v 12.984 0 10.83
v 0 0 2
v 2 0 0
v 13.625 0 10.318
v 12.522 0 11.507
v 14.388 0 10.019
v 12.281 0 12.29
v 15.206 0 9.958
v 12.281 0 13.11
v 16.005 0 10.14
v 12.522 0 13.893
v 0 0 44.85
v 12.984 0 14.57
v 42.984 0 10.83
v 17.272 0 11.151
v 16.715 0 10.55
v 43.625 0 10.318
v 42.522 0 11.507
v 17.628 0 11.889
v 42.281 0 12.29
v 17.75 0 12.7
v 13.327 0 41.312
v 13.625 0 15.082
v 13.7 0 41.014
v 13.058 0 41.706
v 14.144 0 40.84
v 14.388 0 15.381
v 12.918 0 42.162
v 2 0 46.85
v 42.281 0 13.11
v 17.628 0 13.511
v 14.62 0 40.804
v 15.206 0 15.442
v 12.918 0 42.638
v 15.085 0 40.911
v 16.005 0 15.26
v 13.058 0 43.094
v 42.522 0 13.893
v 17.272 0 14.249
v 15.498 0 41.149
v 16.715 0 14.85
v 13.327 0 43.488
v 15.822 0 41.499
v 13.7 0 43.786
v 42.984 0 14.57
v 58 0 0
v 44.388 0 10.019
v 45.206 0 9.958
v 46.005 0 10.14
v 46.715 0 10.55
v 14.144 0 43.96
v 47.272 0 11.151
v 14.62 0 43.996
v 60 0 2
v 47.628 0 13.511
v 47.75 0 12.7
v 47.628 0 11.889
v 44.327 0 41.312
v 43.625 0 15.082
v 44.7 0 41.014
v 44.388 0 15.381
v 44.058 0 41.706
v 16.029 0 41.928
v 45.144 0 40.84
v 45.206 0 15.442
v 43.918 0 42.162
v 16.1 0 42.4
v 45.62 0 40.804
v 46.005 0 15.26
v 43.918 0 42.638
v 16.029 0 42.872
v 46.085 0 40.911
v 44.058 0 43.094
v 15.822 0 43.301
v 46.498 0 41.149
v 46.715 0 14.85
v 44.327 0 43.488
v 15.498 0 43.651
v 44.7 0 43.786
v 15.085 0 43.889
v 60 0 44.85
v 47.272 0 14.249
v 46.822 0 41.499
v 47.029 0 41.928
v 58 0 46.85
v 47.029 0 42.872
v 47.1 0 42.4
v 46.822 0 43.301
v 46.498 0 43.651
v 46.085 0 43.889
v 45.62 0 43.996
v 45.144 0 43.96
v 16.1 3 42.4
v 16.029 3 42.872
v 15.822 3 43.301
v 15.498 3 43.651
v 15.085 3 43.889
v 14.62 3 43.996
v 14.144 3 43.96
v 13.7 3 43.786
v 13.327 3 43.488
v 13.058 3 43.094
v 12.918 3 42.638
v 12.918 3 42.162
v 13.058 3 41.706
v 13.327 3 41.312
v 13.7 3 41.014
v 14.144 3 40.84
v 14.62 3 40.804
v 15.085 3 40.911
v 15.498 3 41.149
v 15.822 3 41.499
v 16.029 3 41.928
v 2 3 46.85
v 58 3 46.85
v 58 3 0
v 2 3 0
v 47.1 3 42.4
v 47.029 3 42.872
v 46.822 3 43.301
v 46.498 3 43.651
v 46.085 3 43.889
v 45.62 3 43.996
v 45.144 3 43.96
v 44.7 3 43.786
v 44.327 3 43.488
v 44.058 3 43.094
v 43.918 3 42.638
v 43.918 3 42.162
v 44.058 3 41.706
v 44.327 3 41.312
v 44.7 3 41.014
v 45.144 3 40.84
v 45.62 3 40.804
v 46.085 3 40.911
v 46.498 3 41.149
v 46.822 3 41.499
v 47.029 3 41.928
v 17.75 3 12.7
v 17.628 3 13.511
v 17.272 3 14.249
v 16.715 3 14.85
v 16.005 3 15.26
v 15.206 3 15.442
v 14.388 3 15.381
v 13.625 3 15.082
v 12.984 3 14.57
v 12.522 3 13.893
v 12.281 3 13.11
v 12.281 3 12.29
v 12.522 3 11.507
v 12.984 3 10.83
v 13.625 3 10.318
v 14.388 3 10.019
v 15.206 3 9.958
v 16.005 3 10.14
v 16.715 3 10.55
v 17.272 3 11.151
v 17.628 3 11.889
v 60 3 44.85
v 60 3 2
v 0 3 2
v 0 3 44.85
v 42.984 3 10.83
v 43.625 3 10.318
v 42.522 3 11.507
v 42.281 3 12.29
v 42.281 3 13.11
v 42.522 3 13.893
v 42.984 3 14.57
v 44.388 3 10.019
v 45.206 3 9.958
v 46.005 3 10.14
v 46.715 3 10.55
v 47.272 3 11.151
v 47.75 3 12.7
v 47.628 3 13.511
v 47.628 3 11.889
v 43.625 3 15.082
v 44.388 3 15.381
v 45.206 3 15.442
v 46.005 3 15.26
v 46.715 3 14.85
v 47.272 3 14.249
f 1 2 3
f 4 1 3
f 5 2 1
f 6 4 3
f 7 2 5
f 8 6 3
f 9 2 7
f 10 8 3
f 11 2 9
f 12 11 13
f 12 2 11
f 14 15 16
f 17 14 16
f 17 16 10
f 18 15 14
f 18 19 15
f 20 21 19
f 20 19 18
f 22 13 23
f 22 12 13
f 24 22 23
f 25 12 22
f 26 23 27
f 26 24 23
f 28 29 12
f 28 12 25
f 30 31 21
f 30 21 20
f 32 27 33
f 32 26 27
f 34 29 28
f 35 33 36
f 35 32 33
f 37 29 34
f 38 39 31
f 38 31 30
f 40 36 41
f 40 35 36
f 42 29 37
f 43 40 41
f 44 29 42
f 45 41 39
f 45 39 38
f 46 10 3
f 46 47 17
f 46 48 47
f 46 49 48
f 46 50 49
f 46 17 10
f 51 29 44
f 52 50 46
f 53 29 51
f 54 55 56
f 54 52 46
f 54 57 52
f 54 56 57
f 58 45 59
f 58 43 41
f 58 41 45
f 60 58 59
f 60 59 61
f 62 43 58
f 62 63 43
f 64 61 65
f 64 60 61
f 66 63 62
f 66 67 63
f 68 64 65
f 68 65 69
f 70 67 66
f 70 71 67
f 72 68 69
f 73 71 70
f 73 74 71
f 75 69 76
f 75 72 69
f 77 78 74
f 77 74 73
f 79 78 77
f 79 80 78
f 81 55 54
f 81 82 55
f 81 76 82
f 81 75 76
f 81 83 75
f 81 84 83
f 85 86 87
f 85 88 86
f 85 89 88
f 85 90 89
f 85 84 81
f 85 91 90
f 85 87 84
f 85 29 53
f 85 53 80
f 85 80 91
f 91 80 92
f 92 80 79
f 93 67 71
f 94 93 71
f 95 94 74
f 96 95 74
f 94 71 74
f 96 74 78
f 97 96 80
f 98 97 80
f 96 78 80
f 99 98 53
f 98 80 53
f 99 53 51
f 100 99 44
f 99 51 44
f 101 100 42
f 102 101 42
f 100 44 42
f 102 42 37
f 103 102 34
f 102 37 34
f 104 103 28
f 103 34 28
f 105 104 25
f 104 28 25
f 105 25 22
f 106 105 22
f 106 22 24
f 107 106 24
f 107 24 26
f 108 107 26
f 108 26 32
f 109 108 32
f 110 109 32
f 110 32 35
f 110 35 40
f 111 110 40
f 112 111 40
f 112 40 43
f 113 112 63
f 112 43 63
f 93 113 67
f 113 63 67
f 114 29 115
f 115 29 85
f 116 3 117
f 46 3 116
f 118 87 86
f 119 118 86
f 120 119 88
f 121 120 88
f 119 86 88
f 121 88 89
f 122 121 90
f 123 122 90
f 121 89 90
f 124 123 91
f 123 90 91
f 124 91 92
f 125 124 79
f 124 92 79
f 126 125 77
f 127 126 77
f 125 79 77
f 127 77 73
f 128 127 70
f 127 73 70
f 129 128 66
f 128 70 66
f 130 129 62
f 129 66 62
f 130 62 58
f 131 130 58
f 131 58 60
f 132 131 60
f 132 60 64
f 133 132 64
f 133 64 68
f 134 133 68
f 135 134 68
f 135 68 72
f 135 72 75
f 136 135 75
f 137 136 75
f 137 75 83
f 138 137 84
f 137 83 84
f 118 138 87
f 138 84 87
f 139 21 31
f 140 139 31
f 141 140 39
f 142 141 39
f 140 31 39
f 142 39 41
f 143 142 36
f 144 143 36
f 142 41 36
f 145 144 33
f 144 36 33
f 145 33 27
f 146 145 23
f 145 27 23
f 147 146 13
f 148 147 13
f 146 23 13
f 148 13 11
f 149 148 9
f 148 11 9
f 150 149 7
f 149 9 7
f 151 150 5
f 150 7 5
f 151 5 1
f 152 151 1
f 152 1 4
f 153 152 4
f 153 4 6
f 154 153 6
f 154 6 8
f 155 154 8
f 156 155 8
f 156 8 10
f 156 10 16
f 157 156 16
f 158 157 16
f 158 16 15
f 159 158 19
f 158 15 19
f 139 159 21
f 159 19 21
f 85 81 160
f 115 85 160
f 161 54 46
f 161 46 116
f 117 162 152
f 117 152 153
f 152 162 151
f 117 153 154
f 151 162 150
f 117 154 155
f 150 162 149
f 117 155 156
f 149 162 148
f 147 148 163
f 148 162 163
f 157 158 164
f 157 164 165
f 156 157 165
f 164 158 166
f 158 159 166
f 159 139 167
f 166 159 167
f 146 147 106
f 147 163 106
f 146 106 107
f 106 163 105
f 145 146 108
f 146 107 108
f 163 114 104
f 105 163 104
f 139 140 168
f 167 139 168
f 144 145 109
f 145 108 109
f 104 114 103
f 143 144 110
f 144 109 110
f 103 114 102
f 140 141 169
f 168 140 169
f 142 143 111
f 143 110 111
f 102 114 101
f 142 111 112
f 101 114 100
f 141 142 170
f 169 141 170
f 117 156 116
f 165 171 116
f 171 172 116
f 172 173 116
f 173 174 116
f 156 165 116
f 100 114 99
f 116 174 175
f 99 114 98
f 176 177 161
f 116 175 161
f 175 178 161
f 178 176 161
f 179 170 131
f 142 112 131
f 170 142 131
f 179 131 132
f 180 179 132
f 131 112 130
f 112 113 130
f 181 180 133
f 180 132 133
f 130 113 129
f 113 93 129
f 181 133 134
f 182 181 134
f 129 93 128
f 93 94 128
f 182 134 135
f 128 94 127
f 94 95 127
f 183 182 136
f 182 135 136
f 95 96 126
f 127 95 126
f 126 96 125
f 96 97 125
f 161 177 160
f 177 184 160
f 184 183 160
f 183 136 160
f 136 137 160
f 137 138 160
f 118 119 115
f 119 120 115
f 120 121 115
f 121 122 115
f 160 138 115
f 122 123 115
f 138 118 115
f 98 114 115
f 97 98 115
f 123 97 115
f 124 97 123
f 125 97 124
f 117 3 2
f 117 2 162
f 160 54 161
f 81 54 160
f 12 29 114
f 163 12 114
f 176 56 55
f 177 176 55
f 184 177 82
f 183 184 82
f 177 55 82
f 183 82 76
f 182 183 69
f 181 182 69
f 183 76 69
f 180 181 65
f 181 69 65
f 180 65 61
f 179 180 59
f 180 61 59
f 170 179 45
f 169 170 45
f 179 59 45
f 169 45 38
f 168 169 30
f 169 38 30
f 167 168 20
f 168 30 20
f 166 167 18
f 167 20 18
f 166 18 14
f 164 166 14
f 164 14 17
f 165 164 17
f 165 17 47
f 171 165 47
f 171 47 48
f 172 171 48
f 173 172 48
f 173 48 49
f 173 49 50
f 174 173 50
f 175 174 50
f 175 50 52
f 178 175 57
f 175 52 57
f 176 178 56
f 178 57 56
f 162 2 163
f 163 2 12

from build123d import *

# Parameters (mm, degrees)
F0_W     = 60
F0_H     = 46.85
F0_R     = 2.75
F0_R_2   = 1.6
F1_DEPTH = 3
F2_SIZE  = 2


with BuildPart() as f1:
    # F0 (on Front) → F1 (new body)
    with BuildSketch(Plane.XZ):
        with Locations((30, 23.425)):
            Rectangle(F0_W, F0_H)
        with Locations((15, 12.7)):
            Circle(F0_R, mode=Mode.SUBTRACT)
        with Locations((45, 12.7)):
            Circle(F0_R, mode=Mode.SUBTRACT)
        with Locations((14.5, 42.4)):
            Circle(F0_R_2, mode=Mode.SUBTRACT)
        with Locations((45.5, 42.4)):
            Circle(F0_R_2, mode=Mode.SUBTRACT)
    extrude(amount=-F1_DEPTH)

    # F2
    f2_edges = [f1.edges().sort_by_distance(p)[0] for p in [
        (0, 1.5, 46.85),
        (0, 1.5, 0),
        (60, 1.5, 0),
        (60, 1.5, 46.85),
    ]]
    chamfer(f2_edges, length=F2_SIZE)


solid = f1.part
